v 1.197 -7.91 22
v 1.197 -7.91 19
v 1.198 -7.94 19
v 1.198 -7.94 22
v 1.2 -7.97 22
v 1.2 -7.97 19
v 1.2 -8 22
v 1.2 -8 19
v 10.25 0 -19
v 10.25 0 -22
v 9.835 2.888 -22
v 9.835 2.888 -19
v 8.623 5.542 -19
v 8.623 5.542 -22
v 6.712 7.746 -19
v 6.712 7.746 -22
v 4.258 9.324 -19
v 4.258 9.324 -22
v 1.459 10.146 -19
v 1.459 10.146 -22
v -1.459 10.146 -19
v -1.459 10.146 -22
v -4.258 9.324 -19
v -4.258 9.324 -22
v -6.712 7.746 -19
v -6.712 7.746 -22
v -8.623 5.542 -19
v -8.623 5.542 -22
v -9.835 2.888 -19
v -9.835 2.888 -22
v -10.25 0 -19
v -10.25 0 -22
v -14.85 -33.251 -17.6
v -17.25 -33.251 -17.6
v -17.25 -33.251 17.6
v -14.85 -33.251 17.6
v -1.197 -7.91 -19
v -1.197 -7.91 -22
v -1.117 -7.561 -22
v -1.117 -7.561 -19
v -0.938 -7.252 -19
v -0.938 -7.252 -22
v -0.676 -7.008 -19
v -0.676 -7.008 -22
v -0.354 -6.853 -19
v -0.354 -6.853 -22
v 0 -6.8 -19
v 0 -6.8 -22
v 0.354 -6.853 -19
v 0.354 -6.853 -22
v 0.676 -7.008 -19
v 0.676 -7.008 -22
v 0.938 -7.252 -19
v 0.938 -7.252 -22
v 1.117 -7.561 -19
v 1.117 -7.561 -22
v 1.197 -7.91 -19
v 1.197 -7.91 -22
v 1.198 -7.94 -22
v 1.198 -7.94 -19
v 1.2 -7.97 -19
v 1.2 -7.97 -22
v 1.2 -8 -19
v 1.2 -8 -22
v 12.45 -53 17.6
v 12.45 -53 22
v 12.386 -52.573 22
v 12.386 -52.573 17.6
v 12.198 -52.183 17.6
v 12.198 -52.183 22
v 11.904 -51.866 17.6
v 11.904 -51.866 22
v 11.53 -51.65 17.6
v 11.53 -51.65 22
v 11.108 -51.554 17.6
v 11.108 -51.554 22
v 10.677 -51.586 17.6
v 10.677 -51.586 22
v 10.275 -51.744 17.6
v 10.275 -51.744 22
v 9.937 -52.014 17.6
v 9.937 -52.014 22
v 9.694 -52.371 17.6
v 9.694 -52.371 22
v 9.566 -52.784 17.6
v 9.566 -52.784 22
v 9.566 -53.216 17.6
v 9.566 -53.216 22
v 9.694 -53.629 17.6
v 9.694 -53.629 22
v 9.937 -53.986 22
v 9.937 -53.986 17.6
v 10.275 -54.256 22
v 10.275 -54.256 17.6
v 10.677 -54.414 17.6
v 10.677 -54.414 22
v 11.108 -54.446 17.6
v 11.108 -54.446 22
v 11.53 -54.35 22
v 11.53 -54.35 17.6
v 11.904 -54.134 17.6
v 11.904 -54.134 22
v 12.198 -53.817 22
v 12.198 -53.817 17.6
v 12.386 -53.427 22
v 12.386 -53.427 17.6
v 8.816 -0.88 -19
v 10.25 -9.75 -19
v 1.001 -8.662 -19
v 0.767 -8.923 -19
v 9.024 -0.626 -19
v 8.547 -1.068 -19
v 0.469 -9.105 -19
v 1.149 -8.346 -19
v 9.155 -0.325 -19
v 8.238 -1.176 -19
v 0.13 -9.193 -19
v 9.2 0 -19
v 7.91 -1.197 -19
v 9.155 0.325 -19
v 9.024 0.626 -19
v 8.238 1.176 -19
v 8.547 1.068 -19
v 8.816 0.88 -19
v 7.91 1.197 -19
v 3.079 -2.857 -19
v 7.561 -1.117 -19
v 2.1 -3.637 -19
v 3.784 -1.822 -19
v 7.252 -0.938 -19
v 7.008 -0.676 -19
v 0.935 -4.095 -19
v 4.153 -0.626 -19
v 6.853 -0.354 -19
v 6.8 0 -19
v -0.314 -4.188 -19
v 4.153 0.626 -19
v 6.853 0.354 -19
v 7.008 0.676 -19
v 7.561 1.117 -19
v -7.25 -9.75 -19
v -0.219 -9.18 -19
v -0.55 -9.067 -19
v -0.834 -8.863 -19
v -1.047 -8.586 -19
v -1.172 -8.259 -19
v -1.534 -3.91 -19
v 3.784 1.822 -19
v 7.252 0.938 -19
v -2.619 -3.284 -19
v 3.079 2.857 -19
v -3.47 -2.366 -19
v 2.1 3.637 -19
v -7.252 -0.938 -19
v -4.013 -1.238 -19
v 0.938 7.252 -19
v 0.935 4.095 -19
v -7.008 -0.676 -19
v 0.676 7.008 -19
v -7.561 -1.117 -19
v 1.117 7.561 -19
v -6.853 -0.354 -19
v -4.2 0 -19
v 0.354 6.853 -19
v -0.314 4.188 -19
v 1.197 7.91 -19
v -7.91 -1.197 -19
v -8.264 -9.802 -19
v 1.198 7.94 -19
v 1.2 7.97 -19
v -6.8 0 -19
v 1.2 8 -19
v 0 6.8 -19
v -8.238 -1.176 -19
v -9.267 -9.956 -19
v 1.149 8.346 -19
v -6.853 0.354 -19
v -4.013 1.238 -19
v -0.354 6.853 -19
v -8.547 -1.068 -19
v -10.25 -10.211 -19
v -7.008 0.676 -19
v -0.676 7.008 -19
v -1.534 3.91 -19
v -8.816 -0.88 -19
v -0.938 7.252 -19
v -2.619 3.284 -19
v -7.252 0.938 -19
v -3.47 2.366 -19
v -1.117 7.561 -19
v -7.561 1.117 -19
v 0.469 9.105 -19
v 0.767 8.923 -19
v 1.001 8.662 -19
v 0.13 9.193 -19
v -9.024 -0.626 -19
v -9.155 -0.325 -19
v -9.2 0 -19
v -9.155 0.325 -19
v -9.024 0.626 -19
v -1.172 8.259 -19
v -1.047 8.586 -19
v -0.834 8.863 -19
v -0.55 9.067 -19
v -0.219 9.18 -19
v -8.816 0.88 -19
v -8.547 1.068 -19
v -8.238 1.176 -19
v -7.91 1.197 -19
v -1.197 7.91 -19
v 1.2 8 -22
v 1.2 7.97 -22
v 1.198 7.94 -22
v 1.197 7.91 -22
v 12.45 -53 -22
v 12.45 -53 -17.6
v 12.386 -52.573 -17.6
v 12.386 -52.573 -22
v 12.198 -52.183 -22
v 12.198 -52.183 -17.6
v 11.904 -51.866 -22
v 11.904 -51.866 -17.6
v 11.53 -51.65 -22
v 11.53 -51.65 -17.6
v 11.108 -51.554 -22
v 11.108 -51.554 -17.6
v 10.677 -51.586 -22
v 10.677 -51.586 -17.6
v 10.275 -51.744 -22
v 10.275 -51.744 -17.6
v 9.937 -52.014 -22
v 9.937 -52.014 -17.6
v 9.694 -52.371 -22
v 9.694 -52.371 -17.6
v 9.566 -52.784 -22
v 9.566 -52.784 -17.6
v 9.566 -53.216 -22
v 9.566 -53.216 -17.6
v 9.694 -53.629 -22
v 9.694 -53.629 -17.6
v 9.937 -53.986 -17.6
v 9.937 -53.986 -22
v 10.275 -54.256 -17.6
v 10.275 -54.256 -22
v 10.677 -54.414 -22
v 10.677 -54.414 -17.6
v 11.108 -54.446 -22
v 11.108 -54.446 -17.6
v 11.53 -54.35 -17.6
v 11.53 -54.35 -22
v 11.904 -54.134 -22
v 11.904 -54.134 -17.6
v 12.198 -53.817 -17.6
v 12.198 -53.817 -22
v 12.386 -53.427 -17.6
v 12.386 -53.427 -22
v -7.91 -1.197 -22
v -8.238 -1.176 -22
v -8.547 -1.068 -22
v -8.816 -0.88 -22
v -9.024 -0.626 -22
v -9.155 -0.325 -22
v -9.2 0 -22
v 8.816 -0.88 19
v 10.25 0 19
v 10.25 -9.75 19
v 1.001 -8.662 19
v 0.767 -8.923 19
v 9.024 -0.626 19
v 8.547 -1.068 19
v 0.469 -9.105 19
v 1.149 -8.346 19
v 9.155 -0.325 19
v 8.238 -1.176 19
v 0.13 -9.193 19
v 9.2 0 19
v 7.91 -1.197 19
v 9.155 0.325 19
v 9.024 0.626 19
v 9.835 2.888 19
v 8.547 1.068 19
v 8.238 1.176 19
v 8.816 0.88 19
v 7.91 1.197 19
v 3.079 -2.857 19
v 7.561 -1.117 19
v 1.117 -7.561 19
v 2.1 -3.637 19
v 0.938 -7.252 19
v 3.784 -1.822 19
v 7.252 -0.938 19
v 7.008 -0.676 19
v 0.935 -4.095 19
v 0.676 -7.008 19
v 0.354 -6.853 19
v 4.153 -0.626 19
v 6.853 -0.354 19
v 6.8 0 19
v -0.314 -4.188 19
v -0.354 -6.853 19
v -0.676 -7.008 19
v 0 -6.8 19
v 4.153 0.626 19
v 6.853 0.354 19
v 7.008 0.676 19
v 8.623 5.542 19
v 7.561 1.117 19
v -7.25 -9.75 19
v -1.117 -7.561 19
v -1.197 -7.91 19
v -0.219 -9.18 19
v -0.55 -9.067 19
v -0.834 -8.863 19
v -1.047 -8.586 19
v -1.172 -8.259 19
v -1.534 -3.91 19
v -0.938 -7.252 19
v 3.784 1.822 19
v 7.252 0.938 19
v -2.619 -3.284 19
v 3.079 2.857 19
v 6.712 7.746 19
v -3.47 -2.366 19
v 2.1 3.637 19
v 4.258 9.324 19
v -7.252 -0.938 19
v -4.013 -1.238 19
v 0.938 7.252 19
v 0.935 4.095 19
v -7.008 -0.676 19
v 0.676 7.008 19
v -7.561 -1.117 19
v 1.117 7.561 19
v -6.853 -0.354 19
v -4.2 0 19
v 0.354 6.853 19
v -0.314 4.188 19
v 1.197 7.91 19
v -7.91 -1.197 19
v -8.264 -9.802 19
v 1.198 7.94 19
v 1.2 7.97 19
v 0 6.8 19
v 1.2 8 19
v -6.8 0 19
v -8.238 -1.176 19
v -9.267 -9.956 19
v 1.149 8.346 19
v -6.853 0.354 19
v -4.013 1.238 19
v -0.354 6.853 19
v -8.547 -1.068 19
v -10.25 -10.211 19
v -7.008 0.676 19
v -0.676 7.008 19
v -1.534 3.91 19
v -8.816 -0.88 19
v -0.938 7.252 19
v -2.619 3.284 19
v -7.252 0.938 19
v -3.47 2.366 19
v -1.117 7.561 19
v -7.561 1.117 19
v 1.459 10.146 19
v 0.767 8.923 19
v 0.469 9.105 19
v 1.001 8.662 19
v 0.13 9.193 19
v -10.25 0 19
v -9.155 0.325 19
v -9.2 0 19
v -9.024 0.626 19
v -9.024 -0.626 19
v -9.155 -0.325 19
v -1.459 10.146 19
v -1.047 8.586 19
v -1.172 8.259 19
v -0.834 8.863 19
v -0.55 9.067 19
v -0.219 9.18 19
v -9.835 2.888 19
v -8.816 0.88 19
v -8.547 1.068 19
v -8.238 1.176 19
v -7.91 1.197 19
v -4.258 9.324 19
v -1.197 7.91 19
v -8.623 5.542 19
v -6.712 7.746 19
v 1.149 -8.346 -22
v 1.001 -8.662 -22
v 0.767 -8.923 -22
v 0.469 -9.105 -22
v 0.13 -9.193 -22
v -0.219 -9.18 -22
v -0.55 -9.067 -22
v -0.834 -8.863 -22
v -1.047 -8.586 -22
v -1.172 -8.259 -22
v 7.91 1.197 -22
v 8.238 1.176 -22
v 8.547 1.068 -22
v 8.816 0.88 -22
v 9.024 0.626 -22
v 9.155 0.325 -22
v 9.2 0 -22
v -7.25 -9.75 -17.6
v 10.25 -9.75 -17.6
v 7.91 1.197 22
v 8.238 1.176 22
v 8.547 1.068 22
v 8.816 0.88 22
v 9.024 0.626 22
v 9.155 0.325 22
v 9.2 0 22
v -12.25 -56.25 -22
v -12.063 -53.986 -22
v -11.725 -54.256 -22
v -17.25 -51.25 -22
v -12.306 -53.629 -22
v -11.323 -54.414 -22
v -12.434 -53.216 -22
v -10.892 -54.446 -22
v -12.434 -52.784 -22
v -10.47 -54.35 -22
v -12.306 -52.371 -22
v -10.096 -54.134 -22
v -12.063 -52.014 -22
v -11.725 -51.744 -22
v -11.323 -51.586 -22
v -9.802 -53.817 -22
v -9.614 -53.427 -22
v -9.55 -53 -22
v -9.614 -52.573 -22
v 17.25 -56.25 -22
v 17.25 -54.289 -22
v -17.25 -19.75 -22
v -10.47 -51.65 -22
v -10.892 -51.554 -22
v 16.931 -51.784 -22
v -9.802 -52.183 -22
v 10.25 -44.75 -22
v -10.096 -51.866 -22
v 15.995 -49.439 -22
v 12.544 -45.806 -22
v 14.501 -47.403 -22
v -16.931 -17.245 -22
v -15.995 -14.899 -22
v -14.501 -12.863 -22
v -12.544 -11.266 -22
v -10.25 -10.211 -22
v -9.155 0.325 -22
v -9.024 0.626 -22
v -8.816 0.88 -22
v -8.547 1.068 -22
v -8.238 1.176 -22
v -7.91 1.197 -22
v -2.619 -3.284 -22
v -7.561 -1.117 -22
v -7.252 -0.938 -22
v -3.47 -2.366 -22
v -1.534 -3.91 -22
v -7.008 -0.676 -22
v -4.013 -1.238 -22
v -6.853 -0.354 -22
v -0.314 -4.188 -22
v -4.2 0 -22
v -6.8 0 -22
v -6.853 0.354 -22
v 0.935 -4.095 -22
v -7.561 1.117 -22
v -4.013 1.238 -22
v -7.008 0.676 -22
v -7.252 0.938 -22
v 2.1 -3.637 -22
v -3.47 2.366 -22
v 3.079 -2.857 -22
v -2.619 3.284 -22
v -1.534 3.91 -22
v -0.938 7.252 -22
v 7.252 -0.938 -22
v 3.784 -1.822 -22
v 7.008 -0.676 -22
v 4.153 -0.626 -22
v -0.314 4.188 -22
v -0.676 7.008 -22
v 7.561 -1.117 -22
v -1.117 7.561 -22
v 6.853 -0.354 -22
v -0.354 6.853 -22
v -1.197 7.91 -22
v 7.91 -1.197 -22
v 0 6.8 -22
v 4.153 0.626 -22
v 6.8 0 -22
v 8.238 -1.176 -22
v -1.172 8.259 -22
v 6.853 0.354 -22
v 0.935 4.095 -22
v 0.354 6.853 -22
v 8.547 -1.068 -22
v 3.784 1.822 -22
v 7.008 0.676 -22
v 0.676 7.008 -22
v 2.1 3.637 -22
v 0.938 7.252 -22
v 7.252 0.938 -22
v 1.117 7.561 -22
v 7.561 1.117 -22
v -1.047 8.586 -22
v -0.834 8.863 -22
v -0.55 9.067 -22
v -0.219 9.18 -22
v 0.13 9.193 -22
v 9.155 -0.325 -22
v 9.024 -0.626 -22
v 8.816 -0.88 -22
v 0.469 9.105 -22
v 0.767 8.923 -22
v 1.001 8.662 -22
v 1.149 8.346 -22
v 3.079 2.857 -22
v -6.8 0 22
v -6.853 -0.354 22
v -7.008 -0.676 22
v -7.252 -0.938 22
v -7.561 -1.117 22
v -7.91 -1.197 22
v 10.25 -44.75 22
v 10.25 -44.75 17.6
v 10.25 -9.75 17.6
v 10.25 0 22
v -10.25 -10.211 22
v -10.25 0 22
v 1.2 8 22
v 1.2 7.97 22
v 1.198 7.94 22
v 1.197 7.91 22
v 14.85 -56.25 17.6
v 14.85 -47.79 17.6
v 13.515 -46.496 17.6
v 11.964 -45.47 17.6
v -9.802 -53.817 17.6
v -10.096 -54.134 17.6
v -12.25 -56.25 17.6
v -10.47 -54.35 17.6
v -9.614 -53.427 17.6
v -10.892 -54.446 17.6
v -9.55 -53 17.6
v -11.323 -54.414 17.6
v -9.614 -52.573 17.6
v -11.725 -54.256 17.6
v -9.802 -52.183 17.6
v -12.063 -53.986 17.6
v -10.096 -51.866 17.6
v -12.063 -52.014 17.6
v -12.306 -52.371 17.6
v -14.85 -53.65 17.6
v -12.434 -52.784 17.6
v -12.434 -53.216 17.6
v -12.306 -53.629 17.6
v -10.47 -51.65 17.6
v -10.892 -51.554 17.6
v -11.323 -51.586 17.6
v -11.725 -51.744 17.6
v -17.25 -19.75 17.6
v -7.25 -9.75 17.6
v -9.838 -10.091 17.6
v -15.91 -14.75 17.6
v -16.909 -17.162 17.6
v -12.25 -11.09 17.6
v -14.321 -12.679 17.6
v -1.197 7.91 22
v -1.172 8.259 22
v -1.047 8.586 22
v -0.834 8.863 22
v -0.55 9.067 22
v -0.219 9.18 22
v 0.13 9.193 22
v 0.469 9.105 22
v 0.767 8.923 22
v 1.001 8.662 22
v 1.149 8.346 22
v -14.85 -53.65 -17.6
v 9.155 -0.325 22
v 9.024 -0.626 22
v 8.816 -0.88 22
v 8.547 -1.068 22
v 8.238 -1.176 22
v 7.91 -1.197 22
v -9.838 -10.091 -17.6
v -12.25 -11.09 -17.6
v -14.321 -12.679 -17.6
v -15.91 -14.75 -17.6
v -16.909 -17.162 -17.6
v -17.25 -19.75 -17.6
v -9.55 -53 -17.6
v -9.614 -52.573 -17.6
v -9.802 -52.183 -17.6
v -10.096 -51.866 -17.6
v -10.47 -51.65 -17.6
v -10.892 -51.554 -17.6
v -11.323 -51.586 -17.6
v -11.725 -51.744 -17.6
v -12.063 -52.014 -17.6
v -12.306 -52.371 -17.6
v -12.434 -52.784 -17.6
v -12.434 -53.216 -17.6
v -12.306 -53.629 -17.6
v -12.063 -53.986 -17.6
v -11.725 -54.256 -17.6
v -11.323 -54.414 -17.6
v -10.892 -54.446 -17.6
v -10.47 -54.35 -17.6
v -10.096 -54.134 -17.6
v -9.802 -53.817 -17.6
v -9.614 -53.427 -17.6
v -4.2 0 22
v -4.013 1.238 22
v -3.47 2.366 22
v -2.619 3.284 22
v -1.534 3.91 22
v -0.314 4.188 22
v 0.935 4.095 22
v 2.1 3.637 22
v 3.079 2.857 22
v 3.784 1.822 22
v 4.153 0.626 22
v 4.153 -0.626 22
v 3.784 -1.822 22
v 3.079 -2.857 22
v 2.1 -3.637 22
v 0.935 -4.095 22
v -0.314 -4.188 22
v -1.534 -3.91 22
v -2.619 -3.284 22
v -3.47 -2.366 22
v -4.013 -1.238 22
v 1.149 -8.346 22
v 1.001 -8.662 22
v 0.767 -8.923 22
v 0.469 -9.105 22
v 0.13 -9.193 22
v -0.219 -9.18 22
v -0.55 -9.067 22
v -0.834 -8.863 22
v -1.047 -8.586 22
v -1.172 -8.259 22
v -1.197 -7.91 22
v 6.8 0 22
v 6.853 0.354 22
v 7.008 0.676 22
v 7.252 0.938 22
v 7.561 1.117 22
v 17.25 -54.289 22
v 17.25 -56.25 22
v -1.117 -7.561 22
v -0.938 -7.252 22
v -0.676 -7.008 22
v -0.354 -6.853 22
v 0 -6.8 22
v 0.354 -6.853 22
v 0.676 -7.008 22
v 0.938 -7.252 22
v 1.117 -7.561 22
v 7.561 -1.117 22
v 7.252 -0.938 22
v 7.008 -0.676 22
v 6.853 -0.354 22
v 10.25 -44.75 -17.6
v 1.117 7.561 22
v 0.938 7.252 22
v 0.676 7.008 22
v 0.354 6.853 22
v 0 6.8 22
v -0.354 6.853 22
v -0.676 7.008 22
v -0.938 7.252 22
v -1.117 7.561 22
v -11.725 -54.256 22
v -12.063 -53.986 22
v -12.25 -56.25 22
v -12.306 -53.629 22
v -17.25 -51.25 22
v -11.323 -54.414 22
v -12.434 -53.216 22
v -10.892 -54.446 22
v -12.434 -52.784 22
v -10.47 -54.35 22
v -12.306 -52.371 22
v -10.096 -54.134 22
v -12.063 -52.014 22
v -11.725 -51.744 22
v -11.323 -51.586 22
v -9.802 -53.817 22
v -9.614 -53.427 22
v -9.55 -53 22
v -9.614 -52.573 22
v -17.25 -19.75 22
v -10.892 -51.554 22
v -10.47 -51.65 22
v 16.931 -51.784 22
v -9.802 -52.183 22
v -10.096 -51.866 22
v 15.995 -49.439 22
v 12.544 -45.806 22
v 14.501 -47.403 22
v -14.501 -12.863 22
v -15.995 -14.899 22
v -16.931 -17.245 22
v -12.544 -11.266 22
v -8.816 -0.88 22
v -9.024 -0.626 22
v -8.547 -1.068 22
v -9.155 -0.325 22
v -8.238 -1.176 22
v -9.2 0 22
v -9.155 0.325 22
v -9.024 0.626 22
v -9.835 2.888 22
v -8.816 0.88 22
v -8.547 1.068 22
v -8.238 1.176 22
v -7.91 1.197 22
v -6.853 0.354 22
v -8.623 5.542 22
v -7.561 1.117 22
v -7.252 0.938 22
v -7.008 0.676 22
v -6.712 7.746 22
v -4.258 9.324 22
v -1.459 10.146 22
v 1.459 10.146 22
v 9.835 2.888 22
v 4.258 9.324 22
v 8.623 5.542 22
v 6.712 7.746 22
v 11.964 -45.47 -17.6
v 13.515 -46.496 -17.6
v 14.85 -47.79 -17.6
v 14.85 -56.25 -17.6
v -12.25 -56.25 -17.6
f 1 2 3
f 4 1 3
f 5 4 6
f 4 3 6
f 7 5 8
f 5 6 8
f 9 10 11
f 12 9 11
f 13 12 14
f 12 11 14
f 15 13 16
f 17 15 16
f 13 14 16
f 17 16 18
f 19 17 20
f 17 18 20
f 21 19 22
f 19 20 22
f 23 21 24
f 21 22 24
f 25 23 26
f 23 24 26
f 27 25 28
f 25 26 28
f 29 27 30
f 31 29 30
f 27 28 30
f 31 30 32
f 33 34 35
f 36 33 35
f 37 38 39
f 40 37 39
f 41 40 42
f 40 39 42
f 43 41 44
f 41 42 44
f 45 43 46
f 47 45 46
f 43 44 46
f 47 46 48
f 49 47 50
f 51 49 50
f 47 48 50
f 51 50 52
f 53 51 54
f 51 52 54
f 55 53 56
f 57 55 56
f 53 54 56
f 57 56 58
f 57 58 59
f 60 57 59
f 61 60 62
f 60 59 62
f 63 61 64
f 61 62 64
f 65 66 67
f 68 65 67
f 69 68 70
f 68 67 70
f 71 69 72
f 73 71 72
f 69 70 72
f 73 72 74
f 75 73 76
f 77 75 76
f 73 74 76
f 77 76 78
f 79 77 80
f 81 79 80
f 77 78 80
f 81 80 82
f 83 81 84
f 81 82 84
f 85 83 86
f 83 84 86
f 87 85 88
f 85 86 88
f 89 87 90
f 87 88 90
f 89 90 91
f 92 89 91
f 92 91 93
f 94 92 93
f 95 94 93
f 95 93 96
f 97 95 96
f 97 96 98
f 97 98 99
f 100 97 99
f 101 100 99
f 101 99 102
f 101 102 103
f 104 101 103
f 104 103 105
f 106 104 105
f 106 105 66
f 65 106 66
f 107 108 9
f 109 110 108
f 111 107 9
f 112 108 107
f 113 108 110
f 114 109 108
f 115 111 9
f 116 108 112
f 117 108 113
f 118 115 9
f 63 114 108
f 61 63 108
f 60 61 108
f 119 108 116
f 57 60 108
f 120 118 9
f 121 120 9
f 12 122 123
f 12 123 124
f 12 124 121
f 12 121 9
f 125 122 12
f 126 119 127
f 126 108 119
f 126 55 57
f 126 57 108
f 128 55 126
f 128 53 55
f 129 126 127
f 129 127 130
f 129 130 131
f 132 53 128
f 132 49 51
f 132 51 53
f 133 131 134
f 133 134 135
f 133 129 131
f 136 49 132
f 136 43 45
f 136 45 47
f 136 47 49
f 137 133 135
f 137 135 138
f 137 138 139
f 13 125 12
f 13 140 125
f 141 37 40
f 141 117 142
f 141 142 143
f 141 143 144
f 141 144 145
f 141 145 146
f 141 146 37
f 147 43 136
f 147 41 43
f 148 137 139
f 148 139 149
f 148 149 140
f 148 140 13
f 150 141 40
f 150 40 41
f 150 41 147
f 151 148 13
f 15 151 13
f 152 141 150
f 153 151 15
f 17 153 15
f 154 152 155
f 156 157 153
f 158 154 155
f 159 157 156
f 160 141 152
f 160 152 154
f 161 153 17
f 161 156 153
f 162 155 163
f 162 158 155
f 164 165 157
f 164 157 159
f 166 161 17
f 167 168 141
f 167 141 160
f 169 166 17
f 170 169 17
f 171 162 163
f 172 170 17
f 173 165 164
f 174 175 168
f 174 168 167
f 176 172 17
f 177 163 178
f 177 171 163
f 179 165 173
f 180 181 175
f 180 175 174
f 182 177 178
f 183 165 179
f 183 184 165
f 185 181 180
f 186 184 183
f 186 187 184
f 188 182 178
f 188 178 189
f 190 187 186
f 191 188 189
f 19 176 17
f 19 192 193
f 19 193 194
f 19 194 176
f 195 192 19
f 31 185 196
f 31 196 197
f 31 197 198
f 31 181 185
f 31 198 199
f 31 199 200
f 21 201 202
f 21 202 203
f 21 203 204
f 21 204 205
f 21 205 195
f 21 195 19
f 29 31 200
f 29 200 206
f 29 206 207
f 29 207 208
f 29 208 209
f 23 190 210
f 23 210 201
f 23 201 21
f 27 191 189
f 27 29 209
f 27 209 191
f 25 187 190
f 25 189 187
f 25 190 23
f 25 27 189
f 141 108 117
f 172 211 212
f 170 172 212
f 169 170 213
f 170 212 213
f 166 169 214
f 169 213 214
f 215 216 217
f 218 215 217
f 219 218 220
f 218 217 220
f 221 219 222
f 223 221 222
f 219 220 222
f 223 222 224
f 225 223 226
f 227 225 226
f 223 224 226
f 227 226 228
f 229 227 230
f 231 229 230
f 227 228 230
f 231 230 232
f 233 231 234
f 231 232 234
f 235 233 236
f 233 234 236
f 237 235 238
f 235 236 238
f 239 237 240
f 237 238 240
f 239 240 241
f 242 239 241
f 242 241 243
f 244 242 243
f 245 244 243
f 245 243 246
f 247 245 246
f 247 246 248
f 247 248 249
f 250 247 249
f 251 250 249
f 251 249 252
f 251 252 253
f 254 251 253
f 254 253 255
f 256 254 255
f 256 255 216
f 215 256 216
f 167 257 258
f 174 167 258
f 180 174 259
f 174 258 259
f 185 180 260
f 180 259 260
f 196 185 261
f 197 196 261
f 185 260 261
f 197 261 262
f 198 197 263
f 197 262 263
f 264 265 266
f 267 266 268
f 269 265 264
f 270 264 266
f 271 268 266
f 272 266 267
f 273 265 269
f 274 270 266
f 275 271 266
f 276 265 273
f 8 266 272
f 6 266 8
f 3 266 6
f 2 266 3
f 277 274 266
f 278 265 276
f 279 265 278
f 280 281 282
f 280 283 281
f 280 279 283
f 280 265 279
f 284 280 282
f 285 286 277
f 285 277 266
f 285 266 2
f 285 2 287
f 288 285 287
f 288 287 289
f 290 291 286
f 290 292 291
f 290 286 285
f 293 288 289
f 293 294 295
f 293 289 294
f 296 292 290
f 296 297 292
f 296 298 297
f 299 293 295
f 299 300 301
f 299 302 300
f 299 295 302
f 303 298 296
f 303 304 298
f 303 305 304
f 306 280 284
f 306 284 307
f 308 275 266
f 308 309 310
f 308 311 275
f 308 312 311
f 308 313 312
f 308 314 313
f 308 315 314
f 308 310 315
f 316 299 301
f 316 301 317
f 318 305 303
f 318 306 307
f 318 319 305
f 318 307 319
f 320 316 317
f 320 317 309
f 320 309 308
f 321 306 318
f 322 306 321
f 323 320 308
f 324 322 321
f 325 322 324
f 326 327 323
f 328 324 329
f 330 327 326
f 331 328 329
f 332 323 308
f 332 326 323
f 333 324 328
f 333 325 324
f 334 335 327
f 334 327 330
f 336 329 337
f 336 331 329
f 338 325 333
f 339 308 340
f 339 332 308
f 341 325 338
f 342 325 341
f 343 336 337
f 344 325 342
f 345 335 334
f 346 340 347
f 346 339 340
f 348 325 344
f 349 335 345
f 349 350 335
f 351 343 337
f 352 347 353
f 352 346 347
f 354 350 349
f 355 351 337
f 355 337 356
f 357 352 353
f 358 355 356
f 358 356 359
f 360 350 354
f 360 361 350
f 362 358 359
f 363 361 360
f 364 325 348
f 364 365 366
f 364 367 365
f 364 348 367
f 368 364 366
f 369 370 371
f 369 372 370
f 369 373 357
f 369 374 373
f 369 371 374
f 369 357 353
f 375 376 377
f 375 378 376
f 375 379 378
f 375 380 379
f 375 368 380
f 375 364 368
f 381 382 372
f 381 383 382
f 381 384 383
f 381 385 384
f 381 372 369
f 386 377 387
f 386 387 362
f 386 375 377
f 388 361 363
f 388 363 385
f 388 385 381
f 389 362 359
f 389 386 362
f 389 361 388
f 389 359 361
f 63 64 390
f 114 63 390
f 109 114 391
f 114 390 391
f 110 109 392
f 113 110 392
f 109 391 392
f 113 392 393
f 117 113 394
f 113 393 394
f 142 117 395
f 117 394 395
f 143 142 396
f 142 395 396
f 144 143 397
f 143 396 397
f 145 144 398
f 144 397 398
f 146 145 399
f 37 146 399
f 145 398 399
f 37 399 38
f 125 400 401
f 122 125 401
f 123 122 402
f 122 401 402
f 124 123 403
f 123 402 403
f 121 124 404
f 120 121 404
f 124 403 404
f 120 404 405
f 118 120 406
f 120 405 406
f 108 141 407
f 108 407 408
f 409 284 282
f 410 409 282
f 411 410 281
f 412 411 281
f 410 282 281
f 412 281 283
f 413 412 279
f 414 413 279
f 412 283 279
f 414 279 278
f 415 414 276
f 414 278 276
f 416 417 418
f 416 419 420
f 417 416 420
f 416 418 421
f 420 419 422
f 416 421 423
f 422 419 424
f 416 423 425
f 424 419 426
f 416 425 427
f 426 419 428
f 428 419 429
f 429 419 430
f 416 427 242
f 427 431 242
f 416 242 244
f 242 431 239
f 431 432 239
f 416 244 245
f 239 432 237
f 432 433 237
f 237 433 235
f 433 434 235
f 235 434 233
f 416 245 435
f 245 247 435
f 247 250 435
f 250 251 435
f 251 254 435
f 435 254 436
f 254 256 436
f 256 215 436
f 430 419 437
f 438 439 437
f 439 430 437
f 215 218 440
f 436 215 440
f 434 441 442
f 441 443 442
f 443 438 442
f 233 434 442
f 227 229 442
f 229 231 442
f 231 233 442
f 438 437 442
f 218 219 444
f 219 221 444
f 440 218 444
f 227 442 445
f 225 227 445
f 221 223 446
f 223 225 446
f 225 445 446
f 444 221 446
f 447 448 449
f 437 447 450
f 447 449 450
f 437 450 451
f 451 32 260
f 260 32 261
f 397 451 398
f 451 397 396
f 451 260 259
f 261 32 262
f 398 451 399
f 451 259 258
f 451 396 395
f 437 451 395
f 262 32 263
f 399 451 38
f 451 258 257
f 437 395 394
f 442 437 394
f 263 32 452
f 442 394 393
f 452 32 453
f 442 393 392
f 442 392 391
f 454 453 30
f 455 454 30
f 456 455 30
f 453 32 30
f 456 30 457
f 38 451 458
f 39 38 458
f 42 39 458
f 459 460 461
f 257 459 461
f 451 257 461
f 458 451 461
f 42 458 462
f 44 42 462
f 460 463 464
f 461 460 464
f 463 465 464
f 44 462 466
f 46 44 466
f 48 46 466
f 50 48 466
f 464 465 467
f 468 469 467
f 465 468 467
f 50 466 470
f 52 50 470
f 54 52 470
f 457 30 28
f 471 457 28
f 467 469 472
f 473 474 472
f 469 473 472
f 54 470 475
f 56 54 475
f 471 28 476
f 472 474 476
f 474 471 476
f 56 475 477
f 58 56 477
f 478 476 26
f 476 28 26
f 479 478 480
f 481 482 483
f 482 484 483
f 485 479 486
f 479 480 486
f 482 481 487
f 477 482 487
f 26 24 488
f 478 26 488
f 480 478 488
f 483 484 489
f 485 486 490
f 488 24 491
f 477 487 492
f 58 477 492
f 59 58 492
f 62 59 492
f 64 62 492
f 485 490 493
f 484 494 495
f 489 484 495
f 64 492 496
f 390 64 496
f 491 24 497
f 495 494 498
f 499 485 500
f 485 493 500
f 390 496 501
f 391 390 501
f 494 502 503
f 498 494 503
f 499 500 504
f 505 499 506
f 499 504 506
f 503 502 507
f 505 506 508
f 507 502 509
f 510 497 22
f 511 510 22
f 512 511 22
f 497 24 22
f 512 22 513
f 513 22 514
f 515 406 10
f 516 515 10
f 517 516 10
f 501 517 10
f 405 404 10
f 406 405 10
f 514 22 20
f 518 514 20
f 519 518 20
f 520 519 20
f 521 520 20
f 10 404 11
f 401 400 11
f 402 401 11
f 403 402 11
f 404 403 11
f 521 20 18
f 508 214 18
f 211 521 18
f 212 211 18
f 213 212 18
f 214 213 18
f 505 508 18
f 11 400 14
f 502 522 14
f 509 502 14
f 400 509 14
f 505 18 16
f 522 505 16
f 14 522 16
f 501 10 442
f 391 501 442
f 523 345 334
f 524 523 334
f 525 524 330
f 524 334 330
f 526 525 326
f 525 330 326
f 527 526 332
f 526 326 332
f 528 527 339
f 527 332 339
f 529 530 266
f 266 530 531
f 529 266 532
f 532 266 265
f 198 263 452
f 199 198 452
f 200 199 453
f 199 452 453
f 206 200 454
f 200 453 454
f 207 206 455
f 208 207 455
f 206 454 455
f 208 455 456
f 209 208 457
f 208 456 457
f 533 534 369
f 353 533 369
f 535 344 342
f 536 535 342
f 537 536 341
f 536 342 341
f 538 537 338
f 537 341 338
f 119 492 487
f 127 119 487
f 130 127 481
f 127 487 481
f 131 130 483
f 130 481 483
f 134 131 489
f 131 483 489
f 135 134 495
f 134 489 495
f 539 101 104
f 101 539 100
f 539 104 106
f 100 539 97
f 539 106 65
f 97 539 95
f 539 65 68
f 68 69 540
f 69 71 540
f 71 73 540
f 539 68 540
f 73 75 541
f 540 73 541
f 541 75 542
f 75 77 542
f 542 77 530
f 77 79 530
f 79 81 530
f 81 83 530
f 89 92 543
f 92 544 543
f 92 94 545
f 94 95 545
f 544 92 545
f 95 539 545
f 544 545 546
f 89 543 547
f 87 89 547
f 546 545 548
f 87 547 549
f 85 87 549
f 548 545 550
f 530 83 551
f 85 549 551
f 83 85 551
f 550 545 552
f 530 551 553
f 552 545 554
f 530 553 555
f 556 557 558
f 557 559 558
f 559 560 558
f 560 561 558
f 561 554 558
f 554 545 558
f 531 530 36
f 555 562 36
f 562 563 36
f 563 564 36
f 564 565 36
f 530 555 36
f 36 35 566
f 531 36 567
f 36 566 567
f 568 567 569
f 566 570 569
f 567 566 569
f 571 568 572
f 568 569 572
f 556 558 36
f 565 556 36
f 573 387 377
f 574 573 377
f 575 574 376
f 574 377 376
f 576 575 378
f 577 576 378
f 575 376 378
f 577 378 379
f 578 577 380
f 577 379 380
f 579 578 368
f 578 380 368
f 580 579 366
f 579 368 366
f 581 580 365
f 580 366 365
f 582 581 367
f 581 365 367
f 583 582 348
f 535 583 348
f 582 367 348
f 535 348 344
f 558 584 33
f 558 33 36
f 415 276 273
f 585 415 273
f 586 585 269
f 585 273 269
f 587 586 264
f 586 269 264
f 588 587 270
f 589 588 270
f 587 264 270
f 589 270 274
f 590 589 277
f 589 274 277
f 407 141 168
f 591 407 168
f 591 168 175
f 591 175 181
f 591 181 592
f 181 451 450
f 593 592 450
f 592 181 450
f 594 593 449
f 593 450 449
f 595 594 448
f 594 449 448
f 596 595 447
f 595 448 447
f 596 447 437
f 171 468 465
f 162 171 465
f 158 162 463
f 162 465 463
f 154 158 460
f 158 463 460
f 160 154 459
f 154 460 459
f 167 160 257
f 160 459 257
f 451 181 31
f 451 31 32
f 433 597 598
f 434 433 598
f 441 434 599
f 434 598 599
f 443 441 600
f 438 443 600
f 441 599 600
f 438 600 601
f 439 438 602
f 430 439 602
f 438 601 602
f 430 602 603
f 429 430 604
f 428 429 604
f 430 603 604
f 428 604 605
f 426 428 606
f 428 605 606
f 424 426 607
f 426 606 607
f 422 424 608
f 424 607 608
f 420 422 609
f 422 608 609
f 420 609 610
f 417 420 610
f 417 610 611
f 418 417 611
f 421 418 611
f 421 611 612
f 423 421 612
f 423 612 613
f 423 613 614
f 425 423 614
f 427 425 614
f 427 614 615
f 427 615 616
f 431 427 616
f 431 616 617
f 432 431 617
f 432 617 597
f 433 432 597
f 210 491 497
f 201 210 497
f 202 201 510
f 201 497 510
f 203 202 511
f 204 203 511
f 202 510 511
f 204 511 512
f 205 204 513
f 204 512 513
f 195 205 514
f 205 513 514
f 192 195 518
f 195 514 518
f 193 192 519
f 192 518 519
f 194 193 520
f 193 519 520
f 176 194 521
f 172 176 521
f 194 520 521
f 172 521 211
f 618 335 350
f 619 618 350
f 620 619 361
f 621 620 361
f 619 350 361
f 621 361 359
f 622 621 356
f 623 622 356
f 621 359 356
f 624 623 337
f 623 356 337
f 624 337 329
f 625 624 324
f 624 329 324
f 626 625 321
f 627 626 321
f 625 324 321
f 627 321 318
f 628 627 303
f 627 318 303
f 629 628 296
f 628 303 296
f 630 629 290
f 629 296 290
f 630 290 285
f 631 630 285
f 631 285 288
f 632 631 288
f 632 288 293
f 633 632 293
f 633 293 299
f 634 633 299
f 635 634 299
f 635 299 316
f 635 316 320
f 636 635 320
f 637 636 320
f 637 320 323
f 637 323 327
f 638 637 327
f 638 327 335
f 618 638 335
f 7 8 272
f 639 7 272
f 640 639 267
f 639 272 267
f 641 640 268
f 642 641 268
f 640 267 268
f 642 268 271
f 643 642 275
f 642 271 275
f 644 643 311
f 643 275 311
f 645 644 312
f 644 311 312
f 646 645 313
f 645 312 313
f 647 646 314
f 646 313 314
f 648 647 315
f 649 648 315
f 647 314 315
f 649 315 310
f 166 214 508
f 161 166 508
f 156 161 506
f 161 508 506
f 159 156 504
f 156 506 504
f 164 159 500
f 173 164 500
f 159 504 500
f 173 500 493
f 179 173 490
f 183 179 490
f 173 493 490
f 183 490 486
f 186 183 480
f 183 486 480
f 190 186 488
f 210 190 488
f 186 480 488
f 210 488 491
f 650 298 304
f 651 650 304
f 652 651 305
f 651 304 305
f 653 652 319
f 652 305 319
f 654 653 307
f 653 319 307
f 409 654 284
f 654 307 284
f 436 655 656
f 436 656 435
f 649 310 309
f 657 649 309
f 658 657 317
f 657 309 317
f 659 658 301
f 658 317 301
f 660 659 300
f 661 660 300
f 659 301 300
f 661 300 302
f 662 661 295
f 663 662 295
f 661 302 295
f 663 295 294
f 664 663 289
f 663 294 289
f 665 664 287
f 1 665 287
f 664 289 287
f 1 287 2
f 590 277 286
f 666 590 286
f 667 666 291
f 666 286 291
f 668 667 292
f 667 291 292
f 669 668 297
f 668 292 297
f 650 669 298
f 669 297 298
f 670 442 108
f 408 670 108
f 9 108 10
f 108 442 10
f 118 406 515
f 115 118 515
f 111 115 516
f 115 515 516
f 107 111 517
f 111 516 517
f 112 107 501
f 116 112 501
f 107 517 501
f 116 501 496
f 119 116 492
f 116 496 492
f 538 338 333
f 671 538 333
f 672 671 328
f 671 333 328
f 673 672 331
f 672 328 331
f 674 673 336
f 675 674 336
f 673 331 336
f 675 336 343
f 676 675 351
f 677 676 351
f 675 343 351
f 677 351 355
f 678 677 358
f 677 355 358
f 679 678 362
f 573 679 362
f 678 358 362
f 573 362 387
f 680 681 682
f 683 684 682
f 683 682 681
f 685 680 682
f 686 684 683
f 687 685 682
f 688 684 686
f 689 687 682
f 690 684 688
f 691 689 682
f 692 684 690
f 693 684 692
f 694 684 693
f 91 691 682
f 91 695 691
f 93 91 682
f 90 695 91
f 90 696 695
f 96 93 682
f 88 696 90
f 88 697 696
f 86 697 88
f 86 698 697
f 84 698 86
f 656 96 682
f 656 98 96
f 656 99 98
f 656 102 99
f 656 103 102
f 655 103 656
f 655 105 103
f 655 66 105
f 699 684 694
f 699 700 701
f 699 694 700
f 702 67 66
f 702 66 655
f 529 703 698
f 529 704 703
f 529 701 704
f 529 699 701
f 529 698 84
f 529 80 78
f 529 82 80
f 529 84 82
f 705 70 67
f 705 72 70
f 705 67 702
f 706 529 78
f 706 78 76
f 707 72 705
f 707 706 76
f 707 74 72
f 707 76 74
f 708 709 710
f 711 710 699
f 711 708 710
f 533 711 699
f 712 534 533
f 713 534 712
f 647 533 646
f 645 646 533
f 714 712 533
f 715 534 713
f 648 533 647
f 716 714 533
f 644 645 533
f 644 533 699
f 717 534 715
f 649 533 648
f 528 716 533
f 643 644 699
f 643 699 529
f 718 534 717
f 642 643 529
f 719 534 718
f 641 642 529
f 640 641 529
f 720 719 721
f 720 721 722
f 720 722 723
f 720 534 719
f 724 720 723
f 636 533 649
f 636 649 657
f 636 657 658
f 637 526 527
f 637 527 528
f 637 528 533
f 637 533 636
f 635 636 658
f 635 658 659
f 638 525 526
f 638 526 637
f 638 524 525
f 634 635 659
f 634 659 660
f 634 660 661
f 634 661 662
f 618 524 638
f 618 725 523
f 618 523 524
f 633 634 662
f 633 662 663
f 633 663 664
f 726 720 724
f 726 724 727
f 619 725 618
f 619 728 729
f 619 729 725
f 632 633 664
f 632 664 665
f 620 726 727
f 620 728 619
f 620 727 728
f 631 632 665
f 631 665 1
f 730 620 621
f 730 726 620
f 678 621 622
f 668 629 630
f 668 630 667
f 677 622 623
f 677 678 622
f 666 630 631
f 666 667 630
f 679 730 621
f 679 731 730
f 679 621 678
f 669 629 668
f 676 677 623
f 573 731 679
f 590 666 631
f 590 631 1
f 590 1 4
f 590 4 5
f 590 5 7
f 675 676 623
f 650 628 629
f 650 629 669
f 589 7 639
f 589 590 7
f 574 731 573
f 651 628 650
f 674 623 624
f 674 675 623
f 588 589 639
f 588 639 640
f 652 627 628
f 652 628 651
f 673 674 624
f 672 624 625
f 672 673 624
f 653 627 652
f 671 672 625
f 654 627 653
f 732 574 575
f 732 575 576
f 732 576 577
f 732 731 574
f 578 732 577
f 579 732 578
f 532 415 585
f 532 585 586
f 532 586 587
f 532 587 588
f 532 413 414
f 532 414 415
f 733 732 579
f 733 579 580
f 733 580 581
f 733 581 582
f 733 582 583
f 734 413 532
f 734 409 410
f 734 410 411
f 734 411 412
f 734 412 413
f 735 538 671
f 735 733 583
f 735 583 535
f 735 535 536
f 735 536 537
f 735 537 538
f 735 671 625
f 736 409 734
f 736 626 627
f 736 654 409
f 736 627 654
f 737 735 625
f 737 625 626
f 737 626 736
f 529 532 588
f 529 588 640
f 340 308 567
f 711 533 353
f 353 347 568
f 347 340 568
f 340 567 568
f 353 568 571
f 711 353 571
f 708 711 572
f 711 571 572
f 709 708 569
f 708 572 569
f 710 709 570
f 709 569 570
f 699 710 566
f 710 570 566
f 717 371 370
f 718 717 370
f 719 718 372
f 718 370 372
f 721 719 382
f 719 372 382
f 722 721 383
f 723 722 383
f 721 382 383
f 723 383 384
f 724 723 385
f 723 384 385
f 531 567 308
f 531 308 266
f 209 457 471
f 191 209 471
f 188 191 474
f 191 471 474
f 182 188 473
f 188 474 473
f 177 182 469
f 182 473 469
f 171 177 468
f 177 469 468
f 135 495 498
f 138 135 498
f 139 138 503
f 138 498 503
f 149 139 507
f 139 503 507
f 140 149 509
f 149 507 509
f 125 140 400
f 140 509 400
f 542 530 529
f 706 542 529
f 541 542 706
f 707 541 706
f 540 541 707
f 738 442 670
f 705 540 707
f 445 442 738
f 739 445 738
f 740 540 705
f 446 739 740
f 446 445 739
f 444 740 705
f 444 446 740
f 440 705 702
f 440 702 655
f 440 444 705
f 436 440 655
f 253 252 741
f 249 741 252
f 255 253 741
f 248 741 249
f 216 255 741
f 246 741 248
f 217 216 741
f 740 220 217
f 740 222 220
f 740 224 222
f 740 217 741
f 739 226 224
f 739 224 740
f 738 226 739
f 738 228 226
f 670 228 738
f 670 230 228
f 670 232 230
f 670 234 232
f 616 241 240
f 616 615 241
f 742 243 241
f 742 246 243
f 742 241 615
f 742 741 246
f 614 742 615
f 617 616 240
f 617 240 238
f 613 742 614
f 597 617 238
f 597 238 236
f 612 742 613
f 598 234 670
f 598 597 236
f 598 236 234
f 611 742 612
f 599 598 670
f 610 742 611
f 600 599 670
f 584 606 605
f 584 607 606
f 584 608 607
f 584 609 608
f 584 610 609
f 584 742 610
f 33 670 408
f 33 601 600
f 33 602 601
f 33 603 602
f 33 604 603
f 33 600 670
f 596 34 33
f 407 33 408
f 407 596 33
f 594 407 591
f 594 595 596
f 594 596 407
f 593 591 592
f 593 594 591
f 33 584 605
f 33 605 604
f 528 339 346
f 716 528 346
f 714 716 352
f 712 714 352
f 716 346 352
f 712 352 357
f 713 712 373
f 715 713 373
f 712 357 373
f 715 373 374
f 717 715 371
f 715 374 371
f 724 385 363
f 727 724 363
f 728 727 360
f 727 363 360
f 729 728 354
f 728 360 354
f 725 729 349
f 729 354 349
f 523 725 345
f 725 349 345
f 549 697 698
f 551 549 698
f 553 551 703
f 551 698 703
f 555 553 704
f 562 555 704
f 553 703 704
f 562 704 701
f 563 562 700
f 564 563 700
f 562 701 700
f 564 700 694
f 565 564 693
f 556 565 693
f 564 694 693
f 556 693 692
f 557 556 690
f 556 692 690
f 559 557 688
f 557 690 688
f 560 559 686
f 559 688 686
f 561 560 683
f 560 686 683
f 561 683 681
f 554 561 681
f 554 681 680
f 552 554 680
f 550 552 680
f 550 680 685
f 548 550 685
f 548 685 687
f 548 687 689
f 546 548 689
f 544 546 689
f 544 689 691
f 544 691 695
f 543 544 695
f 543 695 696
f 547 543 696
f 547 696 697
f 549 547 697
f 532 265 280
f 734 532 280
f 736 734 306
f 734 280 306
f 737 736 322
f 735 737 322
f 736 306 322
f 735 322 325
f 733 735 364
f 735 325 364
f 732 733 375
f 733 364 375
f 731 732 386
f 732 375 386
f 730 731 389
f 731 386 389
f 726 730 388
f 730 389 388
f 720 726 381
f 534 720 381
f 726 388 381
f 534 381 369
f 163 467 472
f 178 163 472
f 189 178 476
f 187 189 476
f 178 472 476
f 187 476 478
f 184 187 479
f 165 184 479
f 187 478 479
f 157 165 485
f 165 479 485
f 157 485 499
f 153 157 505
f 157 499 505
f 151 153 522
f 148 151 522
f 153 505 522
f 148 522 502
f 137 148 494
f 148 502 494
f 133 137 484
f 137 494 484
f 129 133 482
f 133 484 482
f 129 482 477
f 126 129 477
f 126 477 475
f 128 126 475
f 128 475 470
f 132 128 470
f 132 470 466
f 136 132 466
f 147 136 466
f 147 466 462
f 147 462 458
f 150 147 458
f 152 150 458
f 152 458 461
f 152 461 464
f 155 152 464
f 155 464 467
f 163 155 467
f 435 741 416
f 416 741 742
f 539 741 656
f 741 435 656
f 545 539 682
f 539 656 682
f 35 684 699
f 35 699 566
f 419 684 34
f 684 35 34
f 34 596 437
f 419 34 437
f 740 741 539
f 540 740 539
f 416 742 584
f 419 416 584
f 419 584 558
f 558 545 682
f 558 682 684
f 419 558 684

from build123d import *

# Parameters (mm, degrees)
BOSS_EXTRUDE1_DEPTH      = 22
BOSS_EXTRUDE1_DEPTH_BACK = 22
SKETCH2_W                = 38
SKETCH2_H                = 20
CUT_EXTRUDE1_DEPTH       = 105.423416914
SKETCH3_W                = 7
SKETCH3_H                = 44
BOSS_EXTRUDE2_DEPTH      = 65.5
SKETCH23_R               = 5
SKETCH23_R_2             = 1.2
CUT_EXTRUDE2_DEPTH       = 111.605436123
SKETCH24_W               = 28.5
SKETCH24_H               = 34
CUT_EXTRUDE3_DEPTH       = 90.954502389
SKETCH26_R               = 1.2
SKETCH26_R_2             = 5
SKETCH26_R_3             = 1.45
CUT_EXTRUDE6_DEPTH       = 107.330263801
SKETCH27_W               = 29.7
SKETCH27_H               = 35.2
CUT_EXTRUDE8_DEPTH       = 73.137455597
SKETCH29_W               = 7
SKETCH29_H               = 35
CUT_EXTRUDE10_DEPTH      = 74.468530678
CHAMFER2_SIZE            = 5
FILLET1_START            = -23
FILLET1_DEPTH            = 46
FILLET2_R                = 10
SKETCH30_W               = 35.2
SKETCH30_H               = 20
CUT_EXTRUDE12_DEPTH      = 10


with BuildPart() as part:
    # Sketch1 → Boss-Extrude1 (new, two sides: drawn at the far end of the back side and taken through both)
    with BuildSketch(Plane.XY.offset(-BOSS_EXTRUDE1_DEPTH_BACK)):
        with BuildLine():
            Line((10.25, -60), (10.25, 0))
            ThreePointArc((10.25, 0), (0, -10.25), (-10.25, 0))
            Line((-10.25, 0), (-10.25, -60))
            Line((-10.25, -60), (-10.25, -100))
            Line((-10.25, -100), (10.25, -100))
            Line((10.25, -100), (10.25, -60))
        make_face()
        with BuildLine():
            Line((10.25, 0), (9.2, 0))
            ThreePointArc((9.2, 0), (8.816088231, -0.879772698), (7.91, -1.196620241))
            ThreePointArc((7.91, -1.196620241), (5.656854249, -5.656854249), (1.196620241, -7.91))
            ThreePointArc((1.196620241, -7.91), (1.199154762, -7.954968281), (1.2, -8))
            ThreePointArc((1.2, -8), (-0.045031719, -9.199154762), (-1.196620241, -7.91))
            ThreePointArc((-1.196620241, -7.91), (-5.656854249, -5.656854249), (-7.91, -1.196620241))
            ThreePointArc((-7.91, -1.196620241), (-8.816088231, -0.879772698), (-9.2, 0))
            Line((-9.2, 0), (-10.25, 0))
            ThreePointArc((-10.25, 0), (0, -10.25), (10.25, 0))
        make_face()
        with BuildLine():
            ThreePointArc((7.91, -1.196620241), (7.120227302, -0.816088231), (6.8, 0))
            Line((6.8, 0), (4.2, 0))
            ThreePointArc((4.2, 0), (0, -4.2), (-4.2, 0))
            Line((-4.2, 0), (-6.8, 0))
            ThreePointArc((-6.8, 0), (-7.120227302, -0.816088231), (-7.91, -1.196620241))
            ThreePointArc((-7.91, -1.196620241), (-5.656854249, -5.656854249), (-1.196620241, -7.91))
            ThreePointArc((-1.196620241, -7.91), (0, -6.8), (1.196620241, -7.91))
            ThreePointArc((1.196620241, -7.91), (5.656854249, -5.656854249), (7.91, -1.196620241))
        make_face()
        with BuildLine():
            Line((4.2, 0), (6.8, 0))
            ThreePointArc((6.8, 0), (7.120227302, 0.816088231), (7.91, 1.196620241))
            ThreePointArc((7.91, 1.196620241), (5.656854249, 5.656854249), (1.196620241, 7.91))
            ThreePointArc((1.196620241, 7.91), (0, 6.8), (-1.196620241, 7.91))
            ThreePointArc((-1.196620241, 7.91), (-5.656854249, 5.656854249), (-7.91, 1.196620241))
            ThreePointArc((-7.91, 1.196620241), (-7.120227302, 0.816088231), (-6.8, 0))
            Line((-6.8, 0), (-4.2, 0))
            ThreePointArc((-4.2, 0), (0, 4.2), (4.2, 0))
        make_face()
        with BuildLine():
            ThreePointArc((7.91, 1.196620241), (8.816088231, 0.879772698), (9.2, 0))
            Line((9.2, 0), (10.25, 0))
            ThreePointArc((10.25, 0), (0, 10.25), (-10.25, 0))
            Line((-10.25, 0), (-9.2, 0))
            ThreePointArc((-9.2, 0), (-8.816088231, 0.879772698), (-7.91, 1.196620241))
            ThreePointArc((-7.91, 1.196620241), (-5.656854249, 5.656854249), (-1.196620241, 7.91))
            ThreePointArc((-1.196620241, 7.91), (-0.045031719, 9.199154762), (1.2, 8))
            ThreePointArc((1.2, 8), (1.199154762, 7.954968281), (1.196620241, 7.91))
            ThreePointArc((1.196620241, 7.91), (5.656854249, 5.656854249), (7.91, 1.196620241))
        make_face()
    extrude(amount=BOSS_EXTRUDE1_DEPTH + BOSS_EXTRUDE1_DEPTH_BACK)

    # Sketch2 → Cut-Extrude1 (cut, through all)
    with BuildSketch(Plane.ZY.offset(10.25)):
        with Locations((0, 0.25)):
            Rectangle(SKETCH2_W, SKETCH2_H)
    extrude(amount=-CUT_EXTRUDE1_DEPTH, mode=Mode.SUBTRACT)

    # Sketch3 → Boss-Extrude2 (add)
    with BuildSketch(Plane(origin=(0, -9.75, 0), x_dir=(1, 0, 0), z_dir=(0, 1, 0))):
        with Locations((-13.75, 0)):
            Rectangle(SKETCH3_W, SKETCH3_H)
        with Locations((13.75, 0)):
            Rectangle(SKETCH3_W, SKETCH3_H)
    extrude(amount=-BOSS_EXTRUDE2_DEPTH)

    # Sketch23 → Cut-Extrude2 (cut, through all)
    with BuildSketch(Plane.XY.offset(22)):
        with BuildLine():
            Line((-10.25, -100), (10.25, -100))
            Line((10.25, -100), (10.25, -85))
            ThreePointArc((10.25, -85), (0, -95.25), (-10.25, -85))
            Line((-10.25, -85), (-10.25, -100))
        make_face()
        with Locations((0, -85)):
            Circle(SKETCH23_R)
        with Locations((8, -85)):
            Circle(SKETCH23_R_2)
        with Locations((0, -77)):
            Circle(SKETCH23_R_2)
        with Locations((0, -93)):
            Circle(SKETCH23_R_2)
        with Locations((-8, -85)):
            Circle(SKETCH23_R_2)
    extrude(amount=-CUT_EXTRUDE2_DEPTH, mode=Mode.SUBTRACT)

    # Sketch24 → Cut-Extrude3 (cut, through all)
    with BuildSketch(Plane(origin=(0, -9.75, 0), x_dir=(1, 0, 0), z_dir=(0, 1, 0))):
        Rectangle(SKETCH24_W, SKETCH24_H)
    extrude(amount=-CUT_EXTRUDE3_DEPTH, mode=Mode.SUBTRACT)

    # Sketch26 → Cut-Extrude6 (cut, through all)
    # profile 1 of 5: a face of its own
    with BuildSketch(Plane.XY.offset(22)):
        with BuildLine():
            Line((10.25, -75.25), (14.25, -75.25))
            Line((14.25, -75.25), (14.25, -56.53282359))
            Line((14.25, -56.53282359), (14.25, -56.25))
            Line((14.25, -56.25), (-14.25, -56.25))
            Line((-14.25, -56.25), (-14.25, -56.53282359))
            Line((-14.25, -56.53282359), (-14.25, -75.25))
            Line((-14.25, -75.25), (-10.25, -75.25))
            Line((-10.25, -75.25), (-10.25, -85))
            ThreePointArc((-10.25, -85), (0, -95.25), (10.25, -85))
            Line((10.25, -85), (10.25, -75.25))
        make_face()
        with Locations((-8, -85)):
            Circle(SKETCH26_R, mode=Mode.SUBTRACT)
        with Locations((0, -85)):
            Circle(SKETCH26_R_2, mode=Mode.SUBTRACT)
        with Locations((0, -77)):
            Circle(SKETCH26_R, mode=Mode.SUBTRACT)
        with Locations((0, -93)):
            Circle(SKETCH26_R, mode=Mode.SUBTRACT)
        with Locations((8, -85)):
            Circle(SKETCH26_R, mode=Mode.SUBTRACT)
    # profile 2 of 5: a face of its own
    with BuildSketch(Plane.XY.offset(22)):
        Polygon((-17.25, -75.25), (-14.25, -75.25), (-14.25, -56.53282359), (-14.25, -56.25), (-17.25, -56.25), align=None)
    # profile 3 of 5: a face of its own
    with BuildSketch(Plane.XY.offset(22)):
        Polygon((14.25, -56.53282359), (14.25, -75.25), (17.25, -75.25), (17.25, -56.25), (14.25, -56.25), align=None)
    # profile 4 of 5: a face of its own
    with BuildSketch(Plane.XY.offset(22)):
        with Locations((-11, -53)):
            Circle(SKETCH26_R_3)
    # profile 5 of 5: a face of its own
    with BuildSketch(Plane.XY.offset(22)):
        with Locations((11, -53)):
            Circle(SKETCH26_R_3)
    extrude(amount=-CUT_EXTRUDE6_DEPTH, mode=Mode.SUBTRACT)

    # Sketch27 → Cut-Extrude8 (cut, through all)
    with BuildSketch(Plane.XZ.offset(56.25)):
        Rectangle(SKETCH27_W, SKETCH27_H)
    extrude(amount=-CUT_EXTRUDE8_DEPTH, mode=Mode.SUBTRACT)

    # Sketch29 → Cut-Extrude10 (cut, through all)
    with BuildSketch(Plane(origin=(0, 0, -22), x_dir=(-1, 0, 0), z_dir=(0, 0, -1))):
        with Locations((-13.75, -27.25)):
            Rectangle(SKETCH29_W, SKETCH29_H)
    extrude(amount=-CUT_EXTRUDE10_DEPTH, mode=Mode.SUBTRACT)

    # Chamfer2
    # the kernel refuses this chamfer: 5 mm, written as the material it takes off along each edge
    with BuildSketch(Plane(origin=(-17.25, -56.25, 34.85841494), x_dir=(1, 0, 0), z_dir=(0, 0, -1))) as chamfer2_piece_1:
        Polygon((CHAMFER2_SIZE, 0), (0, -CHAMFER2_SIZE), (0, 0), align=None)
    extrude(amount=69.71682988, mode=Mode.SUBTRACT)

    # Fillet1: read off the stored shape, not the designer's step
    # Fillet1 outline → Fillet1 (cut)
    with BuildSketch(Plane.XY.offset(FILLET1_START)):
        with BuildLine():
            ThreePointArc((10.25, -44.75), (15.312257748, -48.373312231), (17.25, -54.289392014))
            Line((17.25, -54.289392014), (17.25, -44.75))
            Line((17.25, -44.75), (10.25, -44.75))
        make_face()
    extrude(amount=FILLET1_DEPTH, mode=Mode.SUBTRACT)

    # Fillet2
    # the kernel refuses this fillet: 10 mm, written as the material it takes off along each edge
    with BuildSketch(Plane(origin=(-17.25, -9.75, -47), x_dir=(1, 0, 0), z_dir=(0, 0, 1))) as fillet2_piece_1_section:
        with BuildLine():
            CenterArc((FILLET2_R, -FILLET2_R), FILLET2_R, 90, 90)
            Line((0, -FILLET2_R), (0, 0))
            Line((0, 0), (FILLET2_R, 0))
        make_face()
    fillet2_piece_1 = extrude(amount=94, mode=Mode.PRIVATE)
    fillet2_piece_1 = split(fillet2_piece_1, bisect_by=Plane(origin=(-10.25, -9.75, -47), z_dir=(-1, 0, 0)), keep=Keep.TOP, mode=Mode.PRIVATE)
    add(fillet2_piece_1, mode=Mode.SUBTRACT)
    with BuildSketch(Plane(origin=(-17.25, -9.75, -47), x_dir=(1, 0, 0), z_dir=(0, 0, 1))) as fillet2_piece_2_section:
        with BuildLine():
            CenterArc((FILLET2_R, -FILLET2_R), FILLET2_R, 90, 90)
            Line((0, -FILLET2_R), (0, 0))
            Line((0, 0), (FILLET2_R, 0))
        make_face()
    fillet2_piece_2 = extrude(amount=94, mode=Mode.PRIVATE)
    fillet2_piece_2 = split(fillet2_piece_2, bisect_by=Plane(origin=(-17.25, -9.75, -19), z_dir=(0, 0, 1)), keep=Keep.TOP, mode=Mode.PRIVATE)
    fillet2_piece_2 = split(fillet2_piece_2, bisect_by=Plane(origin=(-17.25, -9.75, 19), z_dir=(0, 0, -1)), keep=Keep.TOP, mode=Mode.PRIVATE)
    add(fillet2_piece_2, mode=Mode.SUBTRACT)

    # Sketch30 → Cut-Extrude12 (cut)
    with BuildSketch(Plane.ZY.offset(17.25)):
        with Locations((0, -23.250769276)):
            Rectangle(SKETCH30_W, SKETCH30_H)
    extrude(amount=-CUT_EXTRUDE12_DEPTH, mode=Mode.SUBTRACT)


solid = part.part
